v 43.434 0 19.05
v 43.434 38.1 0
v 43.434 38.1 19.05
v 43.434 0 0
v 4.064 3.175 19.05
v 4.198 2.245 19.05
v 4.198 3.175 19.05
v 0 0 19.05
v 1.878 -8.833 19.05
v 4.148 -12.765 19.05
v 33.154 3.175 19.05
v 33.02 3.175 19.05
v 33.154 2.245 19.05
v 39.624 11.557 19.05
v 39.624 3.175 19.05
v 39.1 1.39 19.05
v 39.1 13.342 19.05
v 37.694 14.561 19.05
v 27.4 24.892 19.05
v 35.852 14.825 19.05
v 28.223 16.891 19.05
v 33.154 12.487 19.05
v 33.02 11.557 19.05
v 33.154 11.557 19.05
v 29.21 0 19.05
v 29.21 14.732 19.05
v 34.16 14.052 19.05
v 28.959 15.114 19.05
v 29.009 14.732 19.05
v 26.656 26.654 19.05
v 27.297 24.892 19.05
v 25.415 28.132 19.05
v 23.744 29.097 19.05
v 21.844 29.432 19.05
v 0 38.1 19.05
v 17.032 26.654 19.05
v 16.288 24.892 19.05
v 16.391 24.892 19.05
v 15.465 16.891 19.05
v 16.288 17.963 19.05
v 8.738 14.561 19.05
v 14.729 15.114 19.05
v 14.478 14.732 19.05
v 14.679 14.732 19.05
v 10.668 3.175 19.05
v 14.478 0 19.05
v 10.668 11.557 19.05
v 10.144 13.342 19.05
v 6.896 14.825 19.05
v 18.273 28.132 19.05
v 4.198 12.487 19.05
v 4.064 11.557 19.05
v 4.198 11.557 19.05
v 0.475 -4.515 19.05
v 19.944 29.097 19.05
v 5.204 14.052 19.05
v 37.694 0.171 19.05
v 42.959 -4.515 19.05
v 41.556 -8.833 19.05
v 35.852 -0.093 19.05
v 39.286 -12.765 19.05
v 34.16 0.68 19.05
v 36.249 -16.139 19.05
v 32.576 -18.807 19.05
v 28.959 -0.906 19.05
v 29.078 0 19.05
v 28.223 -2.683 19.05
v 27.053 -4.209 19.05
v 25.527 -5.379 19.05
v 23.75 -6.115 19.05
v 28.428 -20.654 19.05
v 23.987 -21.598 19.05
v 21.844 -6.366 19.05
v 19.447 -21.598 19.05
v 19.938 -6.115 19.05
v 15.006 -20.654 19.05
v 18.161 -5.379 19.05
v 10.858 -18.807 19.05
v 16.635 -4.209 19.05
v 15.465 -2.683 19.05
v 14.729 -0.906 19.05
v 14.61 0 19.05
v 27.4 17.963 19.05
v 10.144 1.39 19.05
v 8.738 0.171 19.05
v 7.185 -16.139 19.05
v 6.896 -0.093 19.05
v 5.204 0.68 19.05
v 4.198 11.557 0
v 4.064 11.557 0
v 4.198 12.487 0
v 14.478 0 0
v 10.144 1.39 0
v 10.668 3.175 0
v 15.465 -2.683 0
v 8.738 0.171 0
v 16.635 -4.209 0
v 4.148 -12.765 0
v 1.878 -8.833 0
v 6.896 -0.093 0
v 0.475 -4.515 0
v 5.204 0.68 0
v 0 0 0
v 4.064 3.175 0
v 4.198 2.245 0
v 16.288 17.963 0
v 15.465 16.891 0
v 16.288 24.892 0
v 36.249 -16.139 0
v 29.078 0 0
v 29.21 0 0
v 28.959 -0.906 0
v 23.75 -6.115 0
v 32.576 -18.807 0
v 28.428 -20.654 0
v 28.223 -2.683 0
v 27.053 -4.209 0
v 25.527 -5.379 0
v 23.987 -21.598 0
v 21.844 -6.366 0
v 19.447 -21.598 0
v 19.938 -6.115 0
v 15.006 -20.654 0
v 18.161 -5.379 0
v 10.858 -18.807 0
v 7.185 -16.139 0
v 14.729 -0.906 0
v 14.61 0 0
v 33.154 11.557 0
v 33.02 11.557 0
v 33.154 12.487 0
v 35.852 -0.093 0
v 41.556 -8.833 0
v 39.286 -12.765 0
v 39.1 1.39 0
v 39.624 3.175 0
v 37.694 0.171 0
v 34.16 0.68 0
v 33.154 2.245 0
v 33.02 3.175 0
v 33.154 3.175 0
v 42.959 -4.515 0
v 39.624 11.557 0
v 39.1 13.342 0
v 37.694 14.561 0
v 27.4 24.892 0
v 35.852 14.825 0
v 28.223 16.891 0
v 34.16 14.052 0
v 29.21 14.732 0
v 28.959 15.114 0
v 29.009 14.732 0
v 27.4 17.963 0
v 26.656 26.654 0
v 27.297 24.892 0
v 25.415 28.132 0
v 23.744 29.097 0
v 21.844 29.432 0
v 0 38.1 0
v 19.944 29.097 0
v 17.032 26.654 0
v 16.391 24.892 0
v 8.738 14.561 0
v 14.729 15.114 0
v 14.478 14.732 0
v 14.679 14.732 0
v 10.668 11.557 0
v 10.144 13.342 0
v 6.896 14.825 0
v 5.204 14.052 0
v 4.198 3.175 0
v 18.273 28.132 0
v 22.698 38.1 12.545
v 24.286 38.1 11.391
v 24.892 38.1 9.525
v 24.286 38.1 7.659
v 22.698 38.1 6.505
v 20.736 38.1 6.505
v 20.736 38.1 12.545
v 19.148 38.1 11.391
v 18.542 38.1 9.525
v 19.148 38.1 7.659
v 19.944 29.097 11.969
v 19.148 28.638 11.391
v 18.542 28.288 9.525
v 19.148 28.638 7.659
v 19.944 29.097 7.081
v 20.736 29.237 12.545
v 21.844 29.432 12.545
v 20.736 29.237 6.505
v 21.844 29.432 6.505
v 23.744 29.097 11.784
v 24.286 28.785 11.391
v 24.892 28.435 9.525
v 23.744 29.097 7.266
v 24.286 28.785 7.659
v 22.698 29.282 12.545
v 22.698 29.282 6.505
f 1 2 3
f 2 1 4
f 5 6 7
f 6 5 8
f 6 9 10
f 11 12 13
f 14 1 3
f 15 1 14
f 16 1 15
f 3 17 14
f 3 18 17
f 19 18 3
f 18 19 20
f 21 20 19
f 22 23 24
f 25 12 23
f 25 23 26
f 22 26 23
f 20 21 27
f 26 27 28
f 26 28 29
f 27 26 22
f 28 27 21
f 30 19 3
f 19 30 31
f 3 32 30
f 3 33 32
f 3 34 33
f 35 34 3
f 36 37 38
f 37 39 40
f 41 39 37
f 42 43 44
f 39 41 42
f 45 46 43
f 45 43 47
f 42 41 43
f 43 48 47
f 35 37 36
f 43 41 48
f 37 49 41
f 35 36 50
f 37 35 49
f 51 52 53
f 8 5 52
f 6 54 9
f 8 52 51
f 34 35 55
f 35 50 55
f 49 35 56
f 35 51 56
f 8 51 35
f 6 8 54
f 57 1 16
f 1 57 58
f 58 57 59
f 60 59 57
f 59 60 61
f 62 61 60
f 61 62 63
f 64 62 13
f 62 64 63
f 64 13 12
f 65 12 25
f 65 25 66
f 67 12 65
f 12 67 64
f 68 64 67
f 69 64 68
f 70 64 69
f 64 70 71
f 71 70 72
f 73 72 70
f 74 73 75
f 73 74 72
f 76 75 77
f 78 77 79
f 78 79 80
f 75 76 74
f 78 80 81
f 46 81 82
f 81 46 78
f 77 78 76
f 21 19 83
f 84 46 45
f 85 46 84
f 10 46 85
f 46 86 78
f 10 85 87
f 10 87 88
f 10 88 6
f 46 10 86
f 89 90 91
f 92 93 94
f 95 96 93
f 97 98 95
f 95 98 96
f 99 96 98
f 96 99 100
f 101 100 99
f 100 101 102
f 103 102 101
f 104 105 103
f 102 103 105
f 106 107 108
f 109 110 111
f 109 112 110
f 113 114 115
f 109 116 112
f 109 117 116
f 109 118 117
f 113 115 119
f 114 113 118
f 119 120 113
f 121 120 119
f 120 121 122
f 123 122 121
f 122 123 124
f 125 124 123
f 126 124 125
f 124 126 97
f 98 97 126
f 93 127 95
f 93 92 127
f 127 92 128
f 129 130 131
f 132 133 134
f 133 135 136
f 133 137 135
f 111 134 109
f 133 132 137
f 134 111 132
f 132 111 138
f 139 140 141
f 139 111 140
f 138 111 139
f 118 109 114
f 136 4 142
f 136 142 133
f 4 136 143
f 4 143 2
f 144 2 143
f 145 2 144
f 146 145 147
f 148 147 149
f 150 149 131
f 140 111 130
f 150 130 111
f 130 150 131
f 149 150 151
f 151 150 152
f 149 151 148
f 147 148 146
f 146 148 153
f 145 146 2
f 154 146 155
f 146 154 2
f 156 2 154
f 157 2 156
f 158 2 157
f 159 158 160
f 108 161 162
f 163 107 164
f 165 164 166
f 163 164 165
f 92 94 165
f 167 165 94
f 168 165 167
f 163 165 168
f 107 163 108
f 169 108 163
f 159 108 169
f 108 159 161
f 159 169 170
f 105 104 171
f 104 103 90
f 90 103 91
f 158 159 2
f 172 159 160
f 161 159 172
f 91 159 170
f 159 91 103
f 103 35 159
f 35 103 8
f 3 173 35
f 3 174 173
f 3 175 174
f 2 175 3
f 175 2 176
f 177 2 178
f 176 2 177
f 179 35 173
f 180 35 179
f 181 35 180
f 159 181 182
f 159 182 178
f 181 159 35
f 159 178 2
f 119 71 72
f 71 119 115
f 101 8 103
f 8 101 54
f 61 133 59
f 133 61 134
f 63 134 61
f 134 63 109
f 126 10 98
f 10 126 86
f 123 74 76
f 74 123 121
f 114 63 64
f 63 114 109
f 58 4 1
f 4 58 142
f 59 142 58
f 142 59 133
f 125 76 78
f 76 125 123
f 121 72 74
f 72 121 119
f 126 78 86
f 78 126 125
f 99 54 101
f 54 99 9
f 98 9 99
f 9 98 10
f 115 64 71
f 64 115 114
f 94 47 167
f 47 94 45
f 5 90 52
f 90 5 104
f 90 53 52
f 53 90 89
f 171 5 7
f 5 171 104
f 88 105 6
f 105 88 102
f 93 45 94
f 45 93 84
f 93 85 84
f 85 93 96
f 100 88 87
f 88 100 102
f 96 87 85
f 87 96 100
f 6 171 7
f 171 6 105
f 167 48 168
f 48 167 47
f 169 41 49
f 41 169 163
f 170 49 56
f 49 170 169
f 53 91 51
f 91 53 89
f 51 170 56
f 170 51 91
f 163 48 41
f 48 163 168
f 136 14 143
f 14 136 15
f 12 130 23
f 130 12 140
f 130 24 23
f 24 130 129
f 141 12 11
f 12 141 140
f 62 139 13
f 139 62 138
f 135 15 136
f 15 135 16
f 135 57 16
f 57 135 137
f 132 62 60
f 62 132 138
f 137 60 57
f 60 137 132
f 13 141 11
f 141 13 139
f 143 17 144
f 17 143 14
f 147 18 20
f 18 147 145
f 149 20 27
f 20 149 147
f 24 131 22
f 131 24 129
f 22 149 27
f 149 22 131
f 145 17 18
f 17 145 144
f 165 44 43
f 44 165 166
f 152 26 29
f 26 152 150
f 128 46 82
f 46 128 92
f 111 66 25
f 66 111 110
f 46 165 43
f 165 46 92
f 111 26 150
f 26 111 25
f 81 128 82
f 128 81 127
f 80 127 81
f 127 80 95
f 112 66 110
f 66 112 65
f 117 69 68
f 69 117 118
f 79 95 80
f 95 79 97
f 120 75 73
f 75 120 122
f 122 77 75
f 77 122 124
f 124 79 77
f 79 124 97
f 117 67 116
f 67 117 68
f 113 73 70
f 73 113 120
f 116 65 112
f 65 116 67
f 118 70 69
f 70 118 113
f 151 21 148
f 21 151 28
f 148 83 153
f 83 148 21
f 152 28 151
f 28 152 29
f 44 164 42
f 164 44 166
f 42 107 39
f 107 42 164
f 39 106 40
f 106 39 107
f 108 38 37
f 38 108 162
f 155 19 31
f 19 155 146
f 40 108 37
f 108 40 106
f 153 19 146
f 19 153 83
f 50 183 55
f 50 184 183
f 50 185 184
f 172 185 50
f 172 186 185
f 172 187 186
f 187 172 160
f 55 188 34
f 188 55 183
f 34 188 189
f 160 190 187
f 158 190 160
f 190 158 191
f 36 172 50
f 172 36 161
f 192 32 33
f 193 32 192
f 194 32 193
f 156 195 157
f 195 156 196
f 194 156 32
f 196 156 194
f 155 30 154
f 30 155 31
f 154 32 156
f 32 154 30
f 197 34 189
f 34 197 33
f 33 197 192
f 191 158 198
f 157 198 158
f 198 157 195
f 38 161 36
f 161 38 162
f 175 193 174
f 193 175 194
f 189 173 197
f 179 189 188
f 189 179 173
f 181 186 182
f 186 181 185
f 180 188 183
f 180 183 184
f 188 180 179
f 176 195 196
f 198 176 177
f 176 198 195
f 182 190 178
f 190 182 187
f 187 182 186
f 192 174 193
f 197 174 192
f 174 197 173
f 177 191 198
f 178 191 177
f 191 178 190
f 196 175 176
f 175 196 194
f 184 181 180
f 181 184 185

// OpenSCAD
function mm(i) = i*25.4 ;
thickness = mm(.75);
width = mm(1.71);
module baseBlock()
{
	union(){
		cube([width,mm(1.5),thickness]);
		translate([width/2,0,0]) {
  			cylinder(thickness,width/2,width/2,0);
		}
	}
}

module slot(){
	union(){
		translate([0,0,-.1]) {
  			cube([mm(.26),mm(.33),thickness+.2]);
		}
		translate([mm(.26)/2,0,-.1]) {
  			cylinder(thickness+.2,mm(.26)/2,mm(.26)/2,0);
		}
		translate([mm(.26)/2,mm(.33),-.1]) {
  			cylinder(thickness+.2,mm(.26)/2,mm(.26)/2,0);
		}
	}
}
module bigslot(){
	length=0.58;
	var= length+.1;
	
	rotate([0, 0, 90]) {

	union(){
			translate([0,0,-.1]) {
  				cube([mm(length),mm(length),thickness+.2]);
			}
			translate([1,mm(length)/2,-.1]) {
  				cylinder(thickness+.2,mm(length)/2,mm(length)/2,0);
			}
			translate([mm(length-.06),mm(length)/2,-.1]) {
  				cylinder(thickness+.2,mm(length)/2,mm(length)/2,0);
			}
			translate([mm(var),mm(length-.4375)/2,-.1]) {
  				cube([mm(.3),mm(.4375),thickness+.2]);
			}
			translate([mm(var+.26),mm(length/2),-.1]) {
  				cylinder(thickness+.2,mm(.4375)/2,mm(.4375)/2,0);
			}
		}
	}
}

module hole()
{
	translate([width/2,mm(1.75),thickness/2]) 
		{rotate([90, 0, 0]) {
			cylinder(mm(1),mm(.25)/2,mm(.25)/2,0);
		}
	}
}


module shape()
{
	difference(){
		baseBlock();
		translate([mm(.16),mm(.25)/2,0]) {
			slot();
		}
		translate([mm(1.3),mm(.25)/2,0]) {
			slot();
		}

		translate([mm(1.15),mm(0)/2,0]) {
			bigslot();
		}
		hole();
	}

}
// linear_extrude(convexity = 10, center = true)
shape();
